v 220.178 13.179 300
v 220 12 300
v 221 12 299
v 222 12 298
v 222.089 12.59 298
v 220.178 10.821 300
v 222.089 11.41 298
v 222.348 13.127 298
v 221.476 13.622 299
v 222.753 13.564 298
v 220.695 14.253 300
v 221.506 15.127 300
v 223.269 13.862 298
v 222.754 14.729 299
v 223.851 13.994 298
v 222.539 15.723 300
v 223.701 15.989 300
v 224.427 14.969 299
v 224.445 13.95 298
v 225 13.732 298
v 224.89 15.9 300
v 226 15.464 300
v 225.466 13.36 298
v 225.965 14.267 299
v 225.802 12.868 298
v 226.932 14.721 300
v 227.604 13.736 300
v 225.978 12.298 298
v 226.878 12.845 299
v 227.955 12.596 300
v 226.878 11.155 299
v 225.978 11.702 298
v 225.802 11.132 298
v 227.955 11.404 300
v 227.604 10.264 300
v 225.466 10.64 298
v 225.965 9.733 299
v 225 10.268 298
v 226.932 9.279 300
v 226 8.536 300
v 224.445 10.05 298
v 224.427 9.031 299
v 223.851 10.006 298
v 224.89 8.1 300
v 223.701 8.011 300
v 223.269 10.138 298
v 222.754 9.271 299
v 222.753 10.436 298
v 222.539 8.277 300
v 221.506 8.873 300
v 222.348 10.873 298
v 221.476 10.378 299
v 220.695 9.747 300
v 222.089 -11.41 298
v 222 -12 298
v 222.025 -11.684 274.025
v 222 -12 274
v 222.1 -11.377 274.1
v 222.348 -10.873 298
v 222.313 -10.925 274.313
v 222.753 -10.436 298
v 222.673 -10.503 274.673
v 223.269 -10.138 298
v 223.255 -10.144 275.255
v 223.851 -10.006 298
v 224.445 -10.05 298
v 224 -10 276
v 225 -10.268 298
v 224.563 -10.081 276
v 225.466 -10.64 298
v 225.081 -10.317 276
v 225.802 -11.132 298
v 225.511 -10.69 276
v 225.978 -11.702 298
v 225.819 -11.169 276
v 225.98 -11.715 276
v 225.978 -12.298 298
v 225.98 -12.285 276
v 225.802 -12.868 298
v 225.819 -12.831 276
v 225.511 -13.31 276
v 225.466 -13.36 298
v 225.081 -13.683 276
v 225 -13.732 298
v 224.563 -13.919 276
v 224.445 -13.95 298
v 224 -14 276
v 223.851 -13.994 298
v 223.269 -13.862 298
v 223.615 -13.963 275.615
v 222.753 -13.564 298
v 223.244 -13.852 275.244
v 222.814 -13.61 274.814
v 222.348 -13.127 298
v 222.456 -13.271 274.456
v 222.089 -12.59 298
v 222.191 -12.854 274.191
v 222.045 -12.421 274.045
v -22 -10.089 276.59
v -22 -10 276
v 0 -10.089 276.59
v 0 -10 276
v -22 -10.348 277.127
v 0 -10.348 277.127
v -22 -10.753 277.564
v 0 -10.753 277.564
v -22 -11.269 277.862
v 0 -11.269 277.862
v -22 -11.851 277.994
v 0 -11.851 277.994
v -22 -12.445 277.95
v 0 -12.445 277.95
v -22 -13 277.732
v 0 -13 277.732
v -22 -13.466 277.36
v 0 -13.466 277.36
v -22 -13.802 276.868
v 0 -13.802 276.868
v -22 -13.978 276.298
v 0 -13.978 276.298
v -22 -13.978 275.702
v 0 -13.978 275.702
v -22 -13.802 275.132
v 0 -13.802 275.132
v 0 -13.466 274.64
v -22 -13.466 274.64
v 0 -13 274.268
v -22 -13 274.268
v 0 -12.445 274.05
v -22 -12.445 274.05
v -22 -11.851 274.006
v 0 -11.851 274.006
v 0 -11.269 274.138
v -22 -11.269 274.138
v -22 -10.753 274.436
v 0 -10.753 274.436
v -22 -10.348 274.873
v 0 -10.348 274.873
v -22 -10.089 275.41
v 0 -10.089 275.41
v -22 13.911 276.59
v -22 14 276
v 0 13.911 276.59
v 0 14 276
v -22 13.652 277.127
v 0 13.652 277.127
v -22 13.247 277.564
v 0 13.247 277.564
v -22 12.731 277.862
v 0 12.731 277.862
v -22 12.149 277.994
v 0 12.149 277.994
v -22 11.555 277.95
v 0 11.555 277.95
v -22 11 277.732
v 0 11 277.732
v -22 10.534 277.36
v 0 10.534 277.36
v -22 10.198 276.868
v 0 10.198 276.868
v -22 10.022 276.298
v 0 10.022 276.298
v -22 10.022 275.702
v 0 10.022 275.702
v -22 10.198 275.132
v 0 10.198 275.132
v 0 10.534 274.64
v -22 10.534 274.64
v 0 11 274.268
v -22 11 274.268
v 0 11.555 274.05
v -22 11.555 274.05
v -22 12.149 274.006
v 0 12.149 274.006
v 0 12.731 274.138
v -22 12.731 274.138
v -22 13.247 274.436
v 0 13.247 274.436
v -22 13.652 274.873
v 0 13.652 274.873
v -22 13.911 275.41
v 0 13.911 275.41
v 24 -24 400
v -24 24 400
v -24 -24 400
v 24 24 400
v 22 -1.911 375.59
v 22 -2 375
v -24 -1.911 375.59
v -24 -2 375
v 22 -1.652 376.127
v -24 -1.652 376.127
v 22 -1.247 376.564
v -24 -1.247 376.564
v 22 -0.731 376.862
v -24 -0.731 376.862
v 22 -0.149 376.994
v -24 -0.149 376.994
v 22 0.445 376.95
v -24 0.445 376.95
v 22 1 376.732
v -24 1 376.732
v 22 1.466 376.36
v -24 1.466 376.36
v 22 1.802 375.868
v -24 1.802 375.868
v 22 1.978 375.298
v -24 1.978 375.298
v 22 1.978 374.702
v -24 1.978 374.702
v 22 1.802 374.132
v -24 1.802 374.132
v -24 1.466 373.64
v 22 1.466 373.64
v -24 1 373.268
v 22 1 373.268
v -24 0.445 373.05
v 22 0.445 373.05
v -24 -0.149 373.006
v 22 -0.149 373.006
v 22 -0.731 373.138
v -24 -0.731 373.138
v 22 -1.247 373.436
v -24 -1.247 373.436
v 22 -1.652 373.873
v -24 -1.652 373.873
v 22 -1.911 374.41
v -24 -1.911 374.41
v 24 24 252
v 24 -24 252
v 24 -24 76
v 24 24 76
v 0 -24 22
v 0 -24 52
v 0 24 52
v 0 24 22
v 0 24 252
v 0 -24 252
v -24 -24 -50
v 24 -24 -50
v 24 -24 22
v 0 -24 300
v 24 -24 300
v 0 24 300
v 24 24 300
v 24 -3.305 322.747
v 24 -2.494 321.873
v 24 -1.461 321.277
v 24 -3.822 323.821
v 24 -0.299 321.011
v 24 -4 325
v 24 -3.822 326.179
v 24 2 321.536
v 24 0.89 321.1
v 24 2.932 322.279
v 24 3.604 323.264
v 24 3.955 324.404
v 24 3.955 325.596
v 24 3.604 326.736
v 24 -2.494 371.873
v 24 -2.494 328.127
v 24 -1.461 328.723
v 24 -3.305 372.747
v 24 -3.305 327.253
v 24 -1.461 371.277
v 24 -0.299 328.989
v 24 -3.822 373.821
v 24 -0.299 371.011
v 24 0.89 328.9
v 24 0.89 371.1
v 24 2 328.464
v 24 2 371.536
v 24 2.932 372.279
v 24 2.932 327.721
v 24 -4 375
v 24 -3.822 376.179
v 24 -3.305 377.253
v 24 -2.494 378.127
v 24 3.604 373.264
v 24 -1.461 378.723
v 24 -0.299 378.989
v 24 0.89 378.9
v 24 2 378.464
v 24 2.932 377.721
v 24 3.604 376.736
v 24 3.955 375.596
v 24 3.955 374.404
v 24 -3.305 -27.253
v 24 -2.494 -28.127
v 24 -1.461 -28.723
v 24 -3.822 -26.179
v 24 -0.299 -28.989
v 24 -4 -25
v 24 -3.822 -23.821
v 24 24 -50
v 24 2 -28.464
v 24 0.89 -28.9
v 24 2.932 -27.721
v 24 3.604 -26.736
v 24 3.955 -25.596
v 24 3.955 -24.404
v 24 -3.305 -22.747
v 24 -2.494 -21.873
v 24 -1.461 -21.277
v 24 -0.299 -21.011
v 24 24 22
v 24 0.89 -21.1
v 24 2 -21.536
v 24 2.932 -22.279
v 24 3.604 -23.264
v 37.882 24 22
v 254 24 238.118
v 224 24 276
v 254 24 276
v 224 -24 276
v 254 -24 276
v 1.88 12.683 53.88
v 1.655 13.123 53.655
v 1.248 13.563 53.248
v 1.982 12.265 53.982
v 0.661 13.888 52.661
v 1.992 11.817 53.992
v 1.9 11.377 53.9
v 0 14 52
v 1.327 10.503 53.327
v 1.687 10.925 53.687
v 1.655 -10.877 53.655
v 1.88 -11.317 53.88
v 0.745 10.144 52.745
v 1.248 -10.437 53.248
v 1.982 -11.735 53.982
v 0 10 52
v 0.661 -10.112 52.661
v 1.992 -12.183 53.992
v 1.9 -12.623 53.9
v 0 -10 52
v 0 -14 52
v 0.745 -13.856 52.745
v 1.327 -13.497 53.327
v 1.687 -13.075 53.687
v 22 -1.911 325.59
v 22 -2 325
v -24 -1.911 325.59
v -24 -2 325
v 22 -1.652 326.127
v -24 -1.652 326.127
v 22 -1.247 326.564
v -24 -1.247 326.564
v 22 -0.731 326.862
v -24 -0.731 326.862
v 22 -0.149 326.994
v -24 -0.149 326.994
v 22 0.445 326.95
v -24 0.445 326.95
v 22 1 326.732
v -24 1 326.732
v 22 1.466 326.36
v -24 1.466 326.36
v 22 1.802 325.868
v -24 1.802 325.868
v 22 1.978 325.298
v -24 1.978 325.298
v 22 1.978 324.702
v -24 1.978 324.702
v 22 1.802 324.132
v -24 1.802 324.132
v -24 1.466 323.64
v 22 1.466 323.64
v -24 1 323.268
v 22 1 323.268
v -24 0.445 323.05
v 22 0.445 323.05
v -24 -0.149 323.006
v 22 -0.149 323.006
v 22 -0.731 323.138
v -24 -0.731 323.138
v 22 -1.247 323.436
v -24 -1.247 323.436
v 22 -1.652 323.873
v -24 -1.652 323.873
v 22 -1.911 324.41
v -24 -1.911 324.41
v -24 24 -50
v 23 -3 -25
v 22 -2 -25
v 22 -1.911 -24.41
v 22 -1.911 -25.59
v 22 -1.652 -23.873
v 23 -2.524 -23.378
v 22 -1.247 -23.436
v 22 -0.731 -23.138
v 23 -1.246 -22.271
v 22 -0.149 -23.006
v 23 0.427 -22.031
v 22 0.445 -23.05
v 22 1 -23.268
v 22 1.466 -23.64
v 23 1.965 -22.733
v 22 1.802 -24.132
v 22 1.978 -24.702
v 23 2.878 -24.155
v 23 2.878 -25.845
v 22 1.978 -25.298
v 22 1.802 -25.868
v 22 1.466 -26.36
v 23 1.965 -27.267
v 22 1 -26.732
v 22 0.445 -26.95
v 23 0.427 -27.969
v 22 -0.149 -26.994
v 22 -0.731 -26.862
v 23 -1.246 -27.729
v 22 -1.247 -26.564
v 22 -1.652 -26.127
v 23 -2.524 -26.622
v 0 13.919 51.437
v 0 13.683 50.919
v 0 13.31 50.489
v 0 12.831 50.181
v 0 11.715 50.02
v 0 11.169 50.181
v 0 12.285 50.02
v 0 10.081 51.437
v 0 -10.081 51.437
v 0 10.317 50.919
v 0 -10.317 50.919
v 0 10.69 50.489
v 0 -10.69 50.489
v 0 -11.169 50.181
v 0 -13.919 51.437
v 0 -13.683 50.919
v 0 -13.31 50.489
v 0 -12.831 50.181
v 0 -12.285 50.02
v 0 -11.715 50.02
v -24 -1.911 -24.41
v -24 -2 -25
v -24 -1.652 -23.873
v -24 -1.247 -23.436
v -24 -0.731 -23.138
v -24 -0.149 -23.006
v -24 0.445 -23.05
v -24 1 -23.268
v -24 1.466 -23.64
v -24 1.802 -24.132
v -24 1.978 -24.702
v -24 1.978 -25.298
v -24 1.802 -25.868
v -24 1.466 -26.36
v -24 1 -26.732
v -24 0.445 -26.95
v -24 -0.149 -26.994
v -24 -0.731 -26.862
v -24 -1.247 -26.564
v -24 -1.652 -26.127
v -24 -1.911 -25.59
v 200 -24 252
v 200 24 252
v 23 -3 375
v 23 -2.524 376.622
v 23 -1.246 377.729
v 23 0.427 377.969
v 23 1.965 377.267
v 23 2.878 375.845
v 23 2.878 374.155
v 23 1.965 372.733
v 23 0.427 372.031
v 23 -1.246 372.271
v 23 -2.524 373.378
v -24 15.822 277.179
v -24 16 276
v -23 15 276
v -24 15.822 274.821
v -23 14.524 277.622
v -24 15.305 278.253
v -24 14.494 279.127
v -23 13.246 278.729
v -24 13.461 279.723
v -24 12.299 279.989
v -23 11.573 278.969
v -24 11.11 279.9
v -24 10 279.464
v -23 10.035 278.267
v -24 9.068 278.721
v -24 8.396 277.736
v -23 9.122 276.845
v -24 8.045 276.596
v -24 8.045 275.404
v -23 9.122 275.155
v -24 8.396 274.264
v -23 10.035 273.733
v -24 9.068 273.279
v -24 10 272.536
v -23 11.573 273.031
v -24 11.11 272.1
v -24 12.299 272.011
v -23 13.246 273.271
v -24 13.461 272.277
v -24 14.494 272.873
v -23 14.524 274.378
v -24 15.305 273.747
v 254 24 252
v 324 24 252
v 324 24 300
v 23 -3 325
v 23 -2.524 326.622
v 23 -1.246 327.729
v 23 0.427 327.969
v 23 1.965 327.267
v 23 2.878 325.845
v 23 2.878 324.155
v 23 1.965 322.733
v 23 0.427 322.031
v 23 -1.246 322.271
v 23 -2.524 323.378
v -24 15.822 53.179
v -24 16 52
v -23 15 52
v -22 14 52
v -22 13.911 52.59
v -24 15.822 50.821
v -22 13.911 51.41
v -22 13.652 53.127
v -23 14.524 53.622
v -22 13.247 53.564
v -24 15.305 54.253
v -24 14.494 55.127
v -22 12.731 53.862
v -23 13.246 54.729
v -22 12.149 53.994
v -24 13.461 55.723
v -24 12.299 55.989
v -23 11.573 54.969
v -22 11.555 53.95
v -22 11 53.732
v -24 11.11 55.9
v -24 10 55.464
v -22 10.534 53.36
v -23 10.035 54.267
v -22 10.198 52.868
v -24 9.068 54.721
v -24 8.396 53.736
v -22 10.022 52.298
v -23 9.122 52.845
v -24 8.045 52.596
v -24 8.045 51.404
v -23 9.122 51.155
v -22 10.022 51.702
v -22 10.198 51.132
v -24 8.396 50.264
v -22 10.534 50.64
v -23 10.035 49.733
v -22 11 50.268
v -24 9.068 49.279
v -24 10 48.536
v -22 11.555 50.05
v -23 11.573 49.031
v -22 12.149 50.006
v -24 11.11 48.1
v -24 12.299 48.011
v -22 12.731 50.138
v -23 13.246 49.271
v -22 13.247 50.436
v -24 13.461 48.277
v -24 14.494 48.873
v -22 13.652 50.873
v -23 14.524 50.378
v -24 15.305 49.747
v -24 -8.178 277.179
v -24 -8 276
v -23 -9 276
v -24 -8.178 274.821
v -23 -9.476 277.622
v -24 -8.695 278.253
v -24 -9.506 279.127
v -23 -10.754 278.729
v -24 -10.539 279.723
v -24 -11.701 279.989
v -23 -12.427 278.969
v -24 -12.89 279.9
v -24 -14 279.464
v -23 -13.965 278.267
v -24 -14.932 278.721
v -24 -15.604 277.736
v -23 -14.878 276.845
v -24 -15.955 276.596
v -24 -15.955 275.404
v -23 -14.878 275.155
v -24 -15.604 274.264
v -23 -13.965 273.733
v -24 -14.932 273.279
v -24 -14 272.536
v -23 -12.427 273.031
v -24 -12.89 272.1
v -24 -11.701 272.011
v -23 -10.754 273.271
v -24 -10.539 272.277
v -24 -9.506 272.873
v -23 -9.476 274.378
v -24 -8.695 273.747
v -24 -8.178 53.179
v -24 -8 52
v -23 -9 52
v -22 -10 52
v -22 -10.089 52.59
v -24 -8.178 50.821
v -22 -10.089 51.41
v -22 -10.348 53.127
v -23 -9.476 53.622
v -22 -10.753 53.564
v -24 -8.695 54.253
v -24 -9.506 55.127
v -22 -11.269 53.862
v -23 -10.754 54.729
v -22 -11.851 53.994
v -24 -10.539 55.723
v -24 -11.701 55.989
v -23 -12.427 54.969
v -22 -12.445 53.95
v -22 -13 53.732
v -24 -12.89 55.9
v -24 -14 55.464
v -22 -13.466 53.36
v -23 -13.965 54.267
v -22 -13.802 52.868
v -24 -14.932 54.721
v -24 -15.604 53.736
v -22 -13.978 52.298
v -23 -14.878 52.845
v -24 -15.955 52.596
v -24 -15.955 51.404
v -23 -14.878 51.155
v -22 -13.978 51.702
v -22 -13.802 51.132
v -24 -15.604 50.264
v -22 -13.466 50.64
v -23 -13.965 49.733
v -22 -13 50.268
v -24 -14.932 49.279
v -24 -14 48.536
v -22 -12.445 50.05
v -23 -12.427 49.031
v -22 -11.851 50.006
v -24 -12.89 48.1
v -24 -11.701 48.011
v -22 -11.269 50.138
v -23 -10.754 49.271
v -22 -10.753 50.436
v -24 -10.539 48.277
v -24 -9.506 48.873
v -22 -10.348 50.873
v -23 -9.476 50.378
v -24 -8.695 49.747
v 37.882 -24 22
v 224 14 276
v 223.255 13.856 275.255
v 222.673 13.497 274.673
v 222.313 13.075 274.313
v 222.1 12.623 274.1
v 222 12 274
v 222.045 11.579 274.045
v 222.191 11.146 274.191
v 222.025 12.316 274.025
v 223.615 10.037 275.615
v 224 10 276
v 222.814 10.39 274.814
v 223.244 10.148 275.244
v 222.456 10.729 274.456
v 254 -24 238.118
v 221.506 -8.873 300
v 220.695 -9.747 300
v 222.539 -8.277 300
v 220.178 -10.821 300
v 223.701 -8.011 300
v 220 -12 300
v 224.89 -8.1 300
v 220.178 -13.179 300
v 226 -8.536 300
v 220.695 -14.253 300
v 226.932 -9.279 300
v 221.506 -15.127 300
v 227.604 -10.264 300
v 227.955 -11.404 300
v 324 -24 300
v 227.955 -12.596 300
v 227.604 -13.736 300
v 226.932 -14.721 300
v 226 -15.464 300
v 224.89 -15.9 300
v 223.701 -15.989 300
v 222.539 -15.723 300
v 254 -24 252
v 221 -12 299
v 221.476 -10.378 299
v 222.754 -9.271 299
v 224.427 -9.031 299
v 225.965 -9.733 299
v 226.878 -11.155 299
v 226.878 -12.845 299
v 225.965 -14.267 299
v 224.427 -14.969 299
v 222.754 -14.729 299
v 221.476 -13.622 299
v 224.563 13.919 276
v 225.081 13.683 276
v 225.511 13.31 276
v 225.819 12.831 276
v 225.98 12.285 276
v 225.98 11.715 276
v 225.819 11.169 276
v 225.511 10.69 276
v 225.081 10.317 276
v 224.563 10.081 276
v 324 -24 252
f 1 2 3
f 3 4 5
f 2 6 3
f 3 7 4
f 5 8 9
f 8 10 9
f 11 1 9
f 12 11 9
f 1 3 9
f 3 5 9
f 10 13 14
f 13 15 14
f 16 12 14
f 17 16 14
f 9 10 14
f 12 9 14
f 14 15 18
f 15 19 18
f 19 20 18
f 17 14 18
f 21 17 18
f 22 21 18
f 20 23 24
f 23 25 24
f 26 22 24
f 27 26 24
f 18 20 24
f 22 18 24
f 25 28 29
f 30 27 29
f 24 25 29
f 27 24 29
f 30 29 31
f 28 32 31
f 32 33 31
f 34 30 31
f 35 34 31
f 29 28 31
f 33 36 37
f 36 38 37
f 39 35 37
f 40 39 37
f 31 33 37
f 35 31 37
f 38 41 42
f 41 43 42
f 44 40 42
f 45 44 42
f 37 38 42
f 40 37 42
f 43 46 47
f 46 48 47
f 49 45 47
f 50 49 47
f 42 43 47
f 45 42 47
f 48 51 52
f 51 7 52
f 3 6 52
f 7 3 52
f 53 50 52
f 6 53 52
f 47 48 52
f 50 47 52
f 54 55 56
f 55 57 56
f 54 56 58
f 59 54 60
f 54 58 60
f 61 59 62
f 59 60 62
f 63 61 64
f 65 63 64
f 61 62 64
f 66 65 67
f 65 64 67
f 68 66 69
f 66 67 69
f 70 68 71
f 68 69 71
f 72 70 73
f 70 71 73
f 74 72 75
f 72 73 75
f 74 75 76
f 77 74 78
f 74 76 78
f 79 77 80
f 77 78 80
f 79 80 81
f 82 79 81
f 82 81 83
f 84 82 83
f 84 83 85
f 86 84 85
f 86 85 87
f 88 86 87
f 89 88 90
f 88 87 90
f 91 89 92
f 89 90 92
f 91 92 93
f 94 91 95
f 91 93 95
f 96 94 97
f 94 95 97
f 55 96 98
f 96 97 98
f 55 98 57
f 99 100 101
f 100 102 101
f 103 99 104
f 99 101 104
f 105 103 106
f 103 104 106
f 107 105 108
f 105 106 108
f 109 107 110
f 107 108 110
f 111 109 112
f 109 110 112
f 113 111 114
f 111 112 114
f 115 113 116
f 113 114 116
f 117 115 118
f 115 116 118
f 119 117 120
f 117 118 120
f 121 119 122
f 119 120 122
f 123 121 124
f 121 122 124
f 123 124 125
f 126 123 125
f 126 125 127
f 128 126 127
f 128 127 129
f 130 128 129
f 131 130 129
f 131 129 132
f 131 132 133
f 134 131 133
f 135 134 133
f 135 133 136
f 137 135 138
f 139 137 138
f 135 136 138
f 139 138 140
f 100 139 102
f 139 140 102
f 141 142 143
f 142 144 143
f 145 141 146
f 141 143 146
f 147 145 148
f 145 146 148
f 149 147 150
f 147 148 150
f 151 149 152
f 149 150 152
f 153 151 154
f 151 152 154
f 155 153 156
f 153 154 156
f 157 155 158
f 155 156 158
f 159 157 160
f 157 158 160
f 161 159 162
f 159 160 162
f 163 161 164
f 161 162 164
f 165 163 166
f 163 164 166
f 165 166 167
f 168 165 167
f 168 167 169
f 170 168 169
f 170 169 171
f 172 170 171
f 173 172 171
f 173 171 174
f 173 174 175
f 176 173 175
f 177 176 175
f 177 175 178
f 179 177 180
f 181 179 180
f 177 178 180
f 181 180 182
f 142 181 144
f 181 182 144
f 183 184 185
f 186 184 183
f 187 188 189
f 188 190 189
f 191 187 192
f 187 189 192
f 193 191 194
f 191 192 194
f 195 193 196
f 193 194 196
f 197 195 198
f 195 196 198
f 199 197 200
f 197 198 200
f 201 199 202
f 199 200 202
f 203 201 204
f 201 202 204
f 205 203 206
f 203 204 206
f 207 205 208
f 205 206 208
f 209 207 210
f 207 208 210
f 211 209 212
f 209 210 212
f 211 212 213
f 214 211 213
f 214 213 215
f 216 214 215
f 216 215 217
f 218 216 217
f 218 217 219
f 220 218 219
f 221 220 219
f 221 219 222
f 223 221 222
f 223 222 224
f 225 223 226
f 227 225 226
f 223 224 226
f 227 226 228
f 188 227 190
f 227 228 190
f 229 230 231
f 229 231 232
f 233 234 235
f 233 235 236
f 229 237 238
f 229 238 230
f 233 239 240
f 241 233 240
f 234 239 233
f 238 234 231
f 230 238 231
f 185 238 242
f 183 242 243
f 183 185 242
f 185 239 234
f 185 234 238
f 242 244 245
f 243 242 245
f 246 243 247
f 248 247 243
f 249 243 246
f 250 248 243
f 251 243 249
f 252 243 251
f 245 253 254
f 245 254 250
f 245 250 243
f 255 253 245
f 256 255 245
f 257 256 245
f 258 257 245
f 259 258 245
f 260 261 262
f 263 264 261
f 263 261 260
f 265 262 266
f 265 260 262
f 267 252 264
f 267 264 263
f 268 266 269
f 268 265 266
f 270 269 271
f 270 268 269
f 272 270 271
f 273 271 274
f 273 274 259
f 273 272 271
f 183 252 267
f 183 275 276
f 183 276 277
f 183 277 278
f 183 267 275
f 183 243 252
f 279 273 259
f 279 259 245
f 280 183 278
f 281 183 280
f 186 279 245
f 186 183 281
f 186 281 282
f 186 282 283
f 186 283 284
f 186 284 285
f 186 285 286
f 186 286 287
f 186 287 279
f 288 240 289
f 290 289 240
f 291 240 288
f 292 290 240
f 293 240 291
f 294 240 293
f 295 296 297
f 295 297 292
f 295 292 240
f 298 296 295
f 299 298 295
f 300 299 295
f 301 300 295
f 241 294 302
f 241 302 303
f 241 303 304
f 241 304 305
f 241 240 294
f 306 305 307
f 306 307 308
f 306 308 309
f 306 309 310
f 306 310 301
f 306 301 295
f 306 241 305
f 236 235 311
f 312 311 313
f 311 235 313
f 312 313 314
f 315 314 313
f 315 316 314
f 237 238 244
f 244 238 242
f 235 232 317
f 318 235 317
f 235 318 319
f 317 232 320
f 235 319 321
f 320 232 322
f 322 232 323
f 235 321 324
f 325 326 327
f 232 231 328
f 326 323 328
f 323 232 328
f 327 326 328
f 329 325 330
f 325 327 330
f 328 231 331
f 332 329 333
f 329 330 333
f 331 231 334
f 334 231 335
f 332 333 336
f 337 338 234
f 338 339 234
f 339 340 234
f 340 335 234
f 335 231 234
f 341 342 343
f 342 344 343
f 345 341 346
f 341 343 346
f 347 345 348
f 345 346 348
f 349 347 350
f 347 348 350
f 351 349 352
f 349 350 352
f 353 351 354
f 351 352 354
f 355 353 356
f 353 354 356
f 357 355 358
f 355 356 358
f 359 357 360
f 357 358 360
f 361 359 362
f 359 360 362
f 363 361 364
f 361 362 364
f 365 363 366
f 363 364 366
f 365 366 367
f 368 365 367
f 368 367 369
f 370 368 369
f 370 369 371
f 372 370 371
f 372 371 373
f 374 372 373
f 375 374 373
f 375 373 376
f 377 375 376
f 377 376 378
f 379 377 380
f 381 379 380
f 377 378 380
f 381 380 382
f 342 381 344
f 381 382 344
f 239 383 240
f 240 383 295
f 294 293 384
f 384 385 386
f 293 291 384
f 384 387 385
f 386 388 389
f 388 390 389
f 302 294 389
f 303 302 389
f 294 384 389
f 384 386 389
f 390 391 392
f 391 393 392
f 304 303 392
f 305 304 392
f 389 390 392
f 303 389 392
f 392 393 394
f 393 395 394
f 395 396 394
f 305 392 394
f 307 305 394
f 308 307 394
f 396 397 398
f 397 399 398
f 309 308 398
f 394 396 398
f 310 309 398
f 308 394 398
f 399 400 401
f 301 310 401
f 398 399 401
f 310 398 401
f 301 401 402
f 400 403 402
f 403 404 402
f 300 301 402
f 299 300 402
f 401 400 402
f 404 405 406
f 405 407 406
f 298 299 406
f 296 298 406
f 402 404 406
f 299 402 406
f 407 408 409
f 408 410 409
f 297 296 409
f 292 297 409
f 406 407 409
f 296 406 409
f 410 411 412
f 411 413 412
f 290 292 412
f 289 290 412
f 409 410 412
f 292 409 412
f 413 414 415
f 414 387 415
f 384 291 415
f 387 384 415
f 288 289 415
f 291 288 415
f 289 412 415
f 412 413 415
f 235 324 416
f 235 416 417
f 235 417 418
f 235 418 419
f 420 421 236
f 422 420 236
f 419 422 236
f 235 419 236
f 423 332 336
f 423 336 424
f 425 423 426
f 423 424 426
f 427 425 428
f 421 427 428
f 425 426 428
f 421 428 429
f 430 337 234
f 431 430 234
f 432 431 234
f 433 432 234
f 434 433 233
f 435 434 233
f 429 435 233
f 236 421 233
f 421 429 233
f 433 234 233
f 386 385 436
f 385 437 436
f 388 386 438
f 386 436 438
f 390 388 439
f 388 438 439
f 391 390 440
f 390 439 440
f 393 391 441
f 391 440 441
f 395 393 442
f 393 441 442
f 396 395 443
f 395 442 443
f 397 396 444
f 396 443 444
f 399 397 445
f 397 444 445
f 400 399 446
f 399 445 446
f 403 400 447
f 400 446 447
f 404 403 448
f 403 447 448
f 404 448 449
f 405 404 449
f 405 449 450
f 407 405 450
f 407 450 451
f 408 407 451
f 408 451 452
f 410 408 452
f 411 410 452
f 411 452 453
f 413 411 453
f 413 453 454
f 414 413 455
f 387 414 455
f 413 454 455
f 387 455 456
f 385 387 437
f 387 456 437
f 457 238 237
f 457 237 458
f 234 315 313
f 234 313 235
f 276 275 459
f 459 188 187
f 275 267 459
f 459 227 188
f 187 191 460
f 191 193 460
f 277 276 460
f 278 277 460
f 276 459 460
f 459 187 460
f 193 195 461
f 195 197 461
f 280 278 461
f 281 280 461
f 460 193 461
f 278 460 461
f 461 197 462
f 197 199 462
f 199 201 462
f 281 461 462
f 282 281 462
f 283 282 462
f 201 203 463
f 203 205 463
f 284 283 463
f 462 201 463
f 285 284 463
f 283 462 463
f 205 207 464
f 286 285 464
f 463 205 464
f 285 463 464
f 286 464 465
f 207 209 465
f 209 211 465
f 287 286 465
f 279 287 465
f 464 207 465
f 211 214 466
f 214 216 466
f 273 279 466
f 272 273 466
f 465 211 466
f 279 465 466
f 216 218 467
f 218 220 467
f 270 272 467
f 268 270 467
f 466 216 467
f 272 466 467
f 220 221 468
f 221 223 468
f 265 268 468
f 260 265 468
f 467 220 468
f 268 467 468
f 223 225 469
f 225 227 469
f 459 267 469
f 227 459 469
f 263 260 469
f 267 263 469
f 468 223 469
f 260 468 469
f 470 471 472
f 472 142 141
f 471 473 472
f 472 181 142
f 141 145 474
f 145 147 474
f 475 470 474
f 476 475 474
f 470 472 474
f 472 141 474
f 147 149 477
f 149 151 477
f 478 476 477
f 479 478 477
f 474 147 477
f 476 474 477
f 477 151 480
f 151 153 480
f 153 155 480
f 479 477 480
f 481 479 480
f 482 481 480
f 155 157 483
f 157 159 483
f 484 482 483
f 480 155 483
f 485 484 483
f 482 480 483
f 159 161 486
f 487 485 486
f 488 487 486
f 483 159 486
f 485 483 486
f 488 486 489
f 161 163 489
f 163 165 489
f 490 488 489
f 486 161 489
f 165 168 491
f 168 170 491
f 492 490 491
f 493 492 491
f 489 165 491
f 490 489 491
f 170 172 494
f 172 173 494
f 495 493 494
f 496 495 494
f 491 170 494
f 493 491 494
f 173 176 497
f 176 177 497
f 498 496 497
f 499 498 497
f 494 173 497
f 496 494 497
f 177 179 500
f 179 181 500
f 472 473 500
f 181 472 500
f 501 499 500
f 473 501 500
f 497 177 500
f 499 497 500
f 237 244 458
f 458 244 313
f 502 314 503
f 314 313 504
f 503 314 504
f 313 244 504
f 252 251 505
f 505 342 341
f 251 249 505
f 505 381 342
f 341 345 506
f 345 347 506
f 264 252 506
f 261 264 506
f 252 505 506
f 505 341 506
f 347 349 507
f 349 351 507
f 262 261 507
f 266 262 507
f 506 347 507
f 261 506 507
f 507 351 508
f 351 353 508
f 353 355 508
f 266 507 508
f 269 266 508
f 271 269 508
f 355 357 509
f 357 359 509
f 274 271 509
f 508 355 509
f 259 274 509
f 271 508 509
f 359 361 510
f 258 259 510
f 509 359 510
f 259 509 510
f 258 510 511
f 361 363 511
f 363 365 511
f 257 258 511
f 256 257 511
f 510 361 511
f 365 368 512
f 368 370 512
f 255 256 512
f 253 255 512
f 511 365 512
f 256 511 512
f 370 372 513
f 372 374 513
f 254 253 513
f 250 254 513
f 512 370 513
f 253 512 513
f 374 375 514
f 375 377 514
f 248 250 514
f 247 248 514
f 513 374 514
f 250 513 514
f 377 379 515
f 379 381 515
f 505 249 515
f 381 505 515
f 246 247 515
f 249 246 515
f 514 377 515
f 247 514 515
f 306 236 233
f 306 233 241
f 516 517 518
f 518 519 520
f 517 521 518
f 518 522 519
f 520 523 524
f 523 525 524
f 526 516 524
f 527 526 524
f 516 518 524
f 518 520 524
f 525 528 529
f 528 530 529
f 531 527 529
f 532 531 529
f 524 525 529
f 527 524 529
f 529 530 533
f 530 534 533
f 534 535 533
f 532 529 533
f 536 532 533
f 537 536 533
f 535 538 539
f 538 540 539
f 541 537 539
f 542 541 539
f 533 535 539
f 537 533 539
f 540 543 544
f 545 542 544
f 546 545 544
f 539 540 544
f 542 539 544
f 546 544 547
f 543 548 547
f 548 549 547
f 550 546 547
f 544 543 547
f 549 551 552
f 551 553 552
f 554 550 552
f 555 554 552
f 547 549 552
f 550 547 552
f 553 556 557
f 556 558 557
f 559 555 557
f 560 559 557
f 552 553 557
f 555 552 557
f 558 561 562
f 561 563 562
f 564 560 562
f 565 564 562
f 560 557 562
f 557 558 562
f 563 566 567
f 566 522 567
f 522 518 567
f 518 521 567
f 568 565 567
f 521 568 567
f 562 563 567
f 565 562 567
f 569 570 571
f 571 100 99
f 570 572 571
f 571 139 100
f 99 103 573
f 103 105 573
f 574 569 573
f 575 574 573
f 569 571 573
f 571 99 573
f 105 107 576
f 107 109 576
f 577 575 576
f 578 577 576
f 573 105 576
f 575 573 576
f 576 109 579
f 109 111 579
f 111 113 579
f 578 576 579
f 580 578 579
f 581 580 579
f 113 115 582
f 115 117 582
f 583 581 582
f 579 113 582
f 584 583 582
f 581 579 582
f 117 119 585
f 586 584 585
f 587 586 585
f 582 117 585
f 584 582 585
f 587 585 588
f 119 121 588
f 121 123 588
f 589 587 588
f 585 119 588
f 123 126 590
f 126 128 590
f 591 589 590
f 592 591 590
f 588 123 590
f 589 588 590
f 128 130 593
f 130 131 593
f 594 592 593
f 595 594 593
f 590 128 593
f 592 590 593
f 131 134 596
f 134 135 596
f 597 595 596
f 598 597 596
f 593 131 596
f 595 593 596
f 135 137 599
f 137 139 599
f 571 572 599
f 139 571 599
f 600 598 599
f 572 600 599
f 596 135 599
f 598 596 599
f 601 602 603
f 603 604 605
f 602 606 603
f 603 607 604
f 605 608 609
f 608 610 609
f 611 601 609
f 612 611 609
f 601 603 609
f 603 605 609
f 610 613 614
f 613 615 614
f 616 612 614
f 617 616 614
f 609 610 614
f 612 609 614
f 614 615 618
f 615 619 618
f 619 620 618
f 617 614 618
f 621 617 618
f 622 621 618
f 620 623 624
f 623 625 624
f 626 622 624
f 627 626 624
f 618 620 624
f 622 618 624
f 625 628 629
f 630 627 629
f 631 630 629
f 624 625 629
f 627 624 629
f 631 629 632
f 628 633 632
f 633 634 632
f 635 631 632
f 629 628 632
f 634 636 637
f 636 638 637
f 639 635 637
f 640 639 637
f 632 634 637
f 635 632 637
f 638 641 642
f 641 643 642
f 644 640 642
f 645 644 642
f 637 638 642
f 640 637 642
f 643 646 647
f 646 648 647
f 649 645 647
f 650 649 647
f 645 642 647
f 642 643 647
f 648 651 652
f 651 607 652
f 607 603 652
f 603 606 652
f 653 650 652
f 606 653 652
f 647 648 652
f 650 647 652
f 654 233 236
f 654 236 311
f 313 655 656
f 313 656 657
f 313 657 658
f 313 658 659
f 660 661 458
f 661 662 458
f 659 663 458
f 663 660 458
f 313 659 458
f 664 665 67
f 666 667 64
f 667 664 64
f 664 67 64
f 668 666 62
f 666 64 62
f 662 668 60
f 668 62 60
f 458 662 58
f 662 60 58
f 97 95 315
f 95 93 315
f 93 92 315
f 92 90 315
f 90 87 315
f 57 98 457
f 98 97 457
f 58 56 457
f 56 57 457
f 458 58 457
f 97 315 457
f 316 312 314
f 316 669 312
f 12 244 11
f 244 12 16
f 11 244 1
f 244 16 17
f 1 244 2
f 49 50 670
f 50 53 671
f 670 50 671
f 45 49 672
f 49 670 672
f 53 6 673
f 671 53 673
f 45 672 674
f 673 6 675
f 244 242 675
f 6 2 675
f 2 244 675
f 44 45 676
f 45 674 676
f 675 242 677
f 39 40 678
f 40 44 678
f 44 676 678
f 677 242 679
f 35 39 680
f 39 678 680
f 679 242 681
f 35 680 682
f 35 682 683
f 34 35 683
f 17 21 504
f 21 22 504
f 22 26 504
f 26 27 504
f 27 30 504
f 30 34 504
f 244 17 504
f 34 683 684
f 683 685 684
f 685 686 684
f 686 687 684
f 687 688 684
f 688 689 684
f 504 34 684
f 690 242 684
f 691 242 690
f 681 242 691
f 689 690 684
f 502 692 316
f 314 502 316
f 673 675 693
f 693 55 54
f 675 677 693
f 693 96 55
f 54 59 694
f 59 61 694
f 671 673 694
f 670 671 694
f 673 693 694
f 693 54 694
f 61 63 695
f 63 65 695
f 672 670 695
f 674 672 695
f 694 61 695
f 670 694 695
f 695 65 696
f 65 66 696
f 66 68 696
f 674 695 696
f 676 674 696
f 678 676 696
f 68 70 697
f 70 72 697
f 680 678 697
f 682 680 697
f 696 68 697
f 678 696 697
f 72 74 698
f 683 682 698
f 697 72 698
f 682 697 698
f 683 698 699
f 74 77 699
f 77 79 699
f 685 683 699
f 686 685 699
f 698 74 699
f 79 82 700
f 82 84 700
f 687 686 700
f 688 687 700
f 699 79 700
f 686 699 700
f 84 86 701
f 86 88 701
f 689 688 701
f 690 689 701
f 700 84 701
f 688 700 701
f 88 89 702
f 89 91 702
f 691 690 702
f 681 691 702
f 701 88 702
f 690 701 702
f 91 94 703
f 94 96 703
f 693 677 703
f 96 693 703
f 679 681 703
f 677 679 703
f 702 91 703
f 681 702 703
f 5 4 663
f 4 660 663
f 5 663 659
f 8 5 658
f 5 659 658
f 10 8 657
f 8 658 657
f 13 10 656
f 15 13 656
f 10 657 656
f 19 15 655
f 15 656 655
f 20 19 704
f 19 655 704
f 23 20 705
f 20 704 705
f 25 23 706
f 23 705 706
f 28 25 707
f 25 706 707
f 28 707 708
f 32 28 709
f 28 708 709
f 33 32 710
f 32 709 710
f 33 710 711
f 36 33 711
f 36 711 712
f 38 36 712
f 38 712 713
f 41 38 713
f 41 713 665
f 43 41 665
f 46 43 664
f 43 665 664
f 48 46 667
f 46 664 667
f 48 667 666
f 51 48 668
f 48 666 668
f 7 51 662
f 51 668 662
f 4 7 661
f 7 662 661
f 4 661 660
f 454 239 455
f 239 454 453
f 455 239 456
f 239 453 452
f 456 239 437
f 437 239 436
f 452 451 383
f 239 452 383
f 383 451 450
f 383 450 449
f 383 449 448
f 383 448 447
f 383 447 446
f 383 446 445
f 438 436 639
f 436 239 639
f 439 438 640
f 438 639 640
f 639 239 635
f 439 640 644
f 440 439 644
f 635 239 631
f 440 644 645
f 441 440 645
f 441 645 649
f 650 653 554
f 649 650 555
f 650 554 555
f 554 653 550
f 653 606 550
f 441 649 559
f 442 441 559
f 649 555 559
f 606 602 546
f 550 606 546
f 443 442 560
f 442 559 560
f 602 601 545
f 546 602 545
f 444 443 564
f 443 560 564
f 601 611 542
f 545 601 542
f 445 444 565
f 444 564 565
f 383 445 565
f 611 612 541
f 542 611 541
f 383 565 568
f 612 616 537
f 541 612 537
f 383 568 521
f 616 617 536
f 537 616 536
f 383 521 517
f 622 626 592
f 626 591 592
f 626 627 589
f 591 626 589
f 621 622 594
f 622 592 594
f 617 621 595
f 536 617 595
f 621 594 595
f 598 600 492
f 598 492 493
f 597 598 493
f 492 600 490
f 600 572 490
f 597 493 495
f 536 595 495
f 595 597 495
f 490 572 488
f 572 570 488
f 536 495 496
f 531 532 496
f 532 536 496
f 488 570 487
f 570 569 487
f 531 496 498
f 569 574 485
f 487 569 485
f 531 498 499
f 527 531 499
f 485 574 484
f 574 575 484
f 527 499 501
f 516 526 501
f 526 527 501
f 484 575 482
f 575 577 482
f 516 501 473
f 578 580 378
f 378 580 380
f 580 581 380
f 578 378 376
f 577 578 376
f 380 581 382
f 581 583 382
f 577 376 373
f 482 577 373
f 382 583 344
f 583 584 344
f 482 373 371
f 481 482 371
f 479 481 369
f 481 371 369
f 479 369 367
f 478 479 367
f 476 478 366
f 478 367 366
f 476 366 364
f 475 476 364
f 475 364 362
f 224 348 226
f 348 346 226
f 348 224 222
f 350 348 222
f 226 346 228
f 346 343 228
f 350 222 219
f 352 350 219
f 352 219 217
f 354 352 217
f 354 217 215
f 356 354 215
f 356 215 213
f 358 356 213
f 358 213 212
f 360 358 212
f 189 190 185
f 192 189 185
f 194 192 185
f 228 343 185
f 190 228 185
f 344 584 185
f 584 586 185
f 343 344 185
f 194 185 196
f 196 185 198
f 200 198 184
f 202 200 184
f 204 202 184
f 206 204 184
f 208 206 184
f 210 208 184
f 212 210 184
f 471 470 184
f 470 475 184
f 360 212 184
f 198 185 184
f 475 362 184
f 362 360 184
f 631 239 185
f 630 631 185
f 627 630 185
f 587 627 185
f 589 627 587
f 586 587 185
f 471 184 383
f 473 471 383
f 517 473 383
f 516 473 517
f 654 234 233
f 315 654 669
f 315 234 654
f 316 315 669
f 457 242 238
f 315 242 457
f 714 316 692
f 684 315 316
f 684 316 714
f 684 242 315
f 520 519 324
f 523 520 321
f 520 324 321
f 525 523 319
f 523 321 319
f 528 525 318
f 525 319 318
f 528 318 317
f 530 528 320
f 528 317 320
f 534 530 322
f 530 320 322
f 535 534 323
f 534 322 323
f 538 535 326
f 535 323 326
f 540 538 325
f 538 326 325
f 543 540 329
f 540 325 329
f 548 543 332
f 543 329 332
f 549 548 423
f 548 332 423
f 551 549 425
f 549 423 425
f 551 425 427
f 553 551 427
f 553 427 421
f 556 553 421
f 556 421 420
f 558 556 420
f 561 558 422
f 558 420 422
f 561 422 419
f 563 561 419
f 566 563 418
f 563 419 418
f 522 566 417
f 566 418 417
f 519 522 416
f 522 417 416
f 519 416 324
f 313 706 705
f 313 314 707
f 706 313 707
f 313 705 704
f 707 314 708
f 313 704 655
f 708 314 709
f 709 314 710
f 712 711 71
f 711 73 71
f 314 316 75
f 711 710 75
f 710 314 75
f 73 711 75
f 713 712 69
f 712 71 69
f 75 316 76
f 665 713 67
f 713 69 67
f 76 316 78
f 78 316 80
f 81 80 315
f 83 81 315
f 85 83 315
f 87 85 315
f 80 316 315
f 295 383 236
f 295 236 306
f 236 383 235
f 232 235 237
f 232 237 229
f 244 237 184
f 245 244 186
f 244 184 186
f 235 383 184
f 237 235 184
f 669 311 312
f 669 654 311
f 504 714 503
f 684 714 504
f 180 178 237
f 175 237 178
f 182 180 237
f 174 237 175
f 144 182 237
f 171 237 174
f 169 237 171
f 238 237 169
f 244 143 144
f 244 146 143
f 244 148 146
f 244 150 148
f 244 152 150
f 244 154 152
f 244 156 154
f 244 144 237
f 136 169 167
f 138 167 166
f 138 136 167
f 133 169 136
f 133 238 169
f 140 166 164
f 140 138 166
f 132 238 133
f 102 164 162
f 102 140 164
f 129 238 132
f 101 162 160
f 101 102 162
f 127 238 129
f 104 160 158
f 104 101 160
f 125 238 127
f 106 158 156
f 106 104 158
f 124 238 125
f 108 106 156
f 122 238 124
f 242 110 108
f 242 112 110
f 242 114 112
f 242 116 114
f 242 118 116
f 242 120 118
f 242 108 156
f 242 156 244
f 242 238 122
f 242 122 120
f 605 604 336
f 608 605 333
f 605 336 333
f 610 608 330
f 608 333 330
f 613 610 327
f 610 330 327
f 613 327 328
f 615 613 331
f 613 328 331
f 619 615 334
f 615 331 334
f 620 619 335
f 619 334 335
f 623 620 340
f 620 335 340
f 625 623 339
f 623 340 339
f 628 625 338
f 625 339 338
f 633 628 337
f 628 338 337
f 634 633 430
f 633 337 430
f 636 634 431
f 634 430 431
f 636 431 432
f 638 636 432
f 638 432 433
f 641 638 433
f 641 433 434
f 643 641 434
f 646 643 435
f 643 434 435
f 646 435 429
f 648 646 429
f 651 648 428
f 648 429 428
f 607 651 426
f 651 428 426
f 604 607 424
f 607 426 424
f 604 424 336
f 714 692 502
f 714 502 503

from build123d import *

# Parameters (mm, degrees)
F0_W            = 48
F0_H            = 48
F1_DEPTH        = 400
F1_DEPTH_BACK   = 50
F2_W            = 324
F2_H            = 48
F3_DEPTH        = 24
F5_DEPTH        = 24
F6_DEPTH        = 24
F7_DEPTH        = 24
F8_DEPTH        = 24
F9_DEPTH        = 25
F12_D           = 4
F12_CSINK_D     = 8
F12_CSINK_ANGLE = 90
F14_D           = 4
F14_CSINK_D     = 8
F14_CSINK_ANGLE = 90
F16_D           = 4
F16_CSINK_D     = 8
F16_CSINK_ANGLE = 90


with BuildPart() as f1:
    # F0 (on Top) → F1 (new body, two sides)
    with BuildSketch(Plane.XY) as f1_sk:
        Rectangle(F0_W, F0_H)
    extrude(amount=F1_DEPTH)
    extrude(f1_sk.sketch, amount=-F1_DEPTH_BACK)

    # F2 (on Front) → F3 (cut, symmetric)
    with BuildSketch(Plane.XZ):
        with Locations((162, 276)):
            Rectangle(F2_W, F2_H)
    extrude(amount=F3_DEPTH, both=True, mode=Mode.SUBTRACT)

    # F4 (on Front) → F5 (cut, symmetric)
    with BuildSketch(Plane.XZ):
        Polygon((254, 276), (224, 276), (0, 52), (0, 22), (37.8822509939, 22), (254, 238.1177490061), align=None)
    extrude(amount=F5_DEPTH, both=True, mode=Mode.SUBTRACT)

    # F14 (through all)
    with Locations(Plane(origin=(-24, 0, 0), x_dir=(0, -1, 0), z_dir=(-1, 0, 0))):
        with Locations((-12, 276), (12, 276), (-12, 52), (12, 52)):
            CounterSinkHole(F14_D / 2, F14_CSINK_D / 2, counter_sink_angle=F14_CSINK_ANGLE)

    # F16 (through all)
    with Locations(Plane.YZ.offset(24)):
        with Locations((0, 375), (0, 325), (0, -25)):
            CounterSinkHole(F16_D / 2, F16_CSINK_D / 2, counter_sink_angle=F16_CSINK_ANGLE)


with BuildPart() as f6:
    # F2 (on Front) → F6 (new body, symmetric)
    with BuildSketch(Plane.XZ):
        with Locations((162, 276)):
            Rectangle(F2_W, F2_H)
    extrude(amount=F6_DEPTH, both=True)

    # F4 (on Front) → F7 (cut, symmetric)
    with BuildSketch(Plane.XZ):
        Polygon((254, 276), (224, 276), (0, 52), (0, 22), (37.8822509939, 22), (254, 238.1177490061), align=None)
    extrude(amount=F7_DEPTH, both=True, mode=Mode.SUBTRACT)

    # F12 (through all)
    with Locations(Plane.XY.offset(300)):
        with Locations((224, -12), (224, 12)):
            CounterSinkHole(F12_D / 2, F12_CSINK_D / 2, counter_sink_angle=F12_CSINK_ANGLE)


with BuildPart() as f8:
    # F4 (on Front) → F8 (new body, symmetric)
    with BuildSketch(Plane.XZ):
        Polygon((254, 276), (224, 276), (0, 52), (0, 22), (37.8822509939, 22), (254, 238.1177490061), align=None)
    extrude(amount=F8_DEPTH, both=True)


with BuildPart() as f9:
    # F4 (on Front) → F9 (new body)
    with BuildSketch(Plane.XZ):
        Polygon((254, 276), (224, 276), (0, 52), (0, 22), (37.8822509939, 22), (254, 238.1177490061), align=None)
    extrude(amount=F9_DEPTH)


solid = Compound([f1.part, f6.part, f8.part])
